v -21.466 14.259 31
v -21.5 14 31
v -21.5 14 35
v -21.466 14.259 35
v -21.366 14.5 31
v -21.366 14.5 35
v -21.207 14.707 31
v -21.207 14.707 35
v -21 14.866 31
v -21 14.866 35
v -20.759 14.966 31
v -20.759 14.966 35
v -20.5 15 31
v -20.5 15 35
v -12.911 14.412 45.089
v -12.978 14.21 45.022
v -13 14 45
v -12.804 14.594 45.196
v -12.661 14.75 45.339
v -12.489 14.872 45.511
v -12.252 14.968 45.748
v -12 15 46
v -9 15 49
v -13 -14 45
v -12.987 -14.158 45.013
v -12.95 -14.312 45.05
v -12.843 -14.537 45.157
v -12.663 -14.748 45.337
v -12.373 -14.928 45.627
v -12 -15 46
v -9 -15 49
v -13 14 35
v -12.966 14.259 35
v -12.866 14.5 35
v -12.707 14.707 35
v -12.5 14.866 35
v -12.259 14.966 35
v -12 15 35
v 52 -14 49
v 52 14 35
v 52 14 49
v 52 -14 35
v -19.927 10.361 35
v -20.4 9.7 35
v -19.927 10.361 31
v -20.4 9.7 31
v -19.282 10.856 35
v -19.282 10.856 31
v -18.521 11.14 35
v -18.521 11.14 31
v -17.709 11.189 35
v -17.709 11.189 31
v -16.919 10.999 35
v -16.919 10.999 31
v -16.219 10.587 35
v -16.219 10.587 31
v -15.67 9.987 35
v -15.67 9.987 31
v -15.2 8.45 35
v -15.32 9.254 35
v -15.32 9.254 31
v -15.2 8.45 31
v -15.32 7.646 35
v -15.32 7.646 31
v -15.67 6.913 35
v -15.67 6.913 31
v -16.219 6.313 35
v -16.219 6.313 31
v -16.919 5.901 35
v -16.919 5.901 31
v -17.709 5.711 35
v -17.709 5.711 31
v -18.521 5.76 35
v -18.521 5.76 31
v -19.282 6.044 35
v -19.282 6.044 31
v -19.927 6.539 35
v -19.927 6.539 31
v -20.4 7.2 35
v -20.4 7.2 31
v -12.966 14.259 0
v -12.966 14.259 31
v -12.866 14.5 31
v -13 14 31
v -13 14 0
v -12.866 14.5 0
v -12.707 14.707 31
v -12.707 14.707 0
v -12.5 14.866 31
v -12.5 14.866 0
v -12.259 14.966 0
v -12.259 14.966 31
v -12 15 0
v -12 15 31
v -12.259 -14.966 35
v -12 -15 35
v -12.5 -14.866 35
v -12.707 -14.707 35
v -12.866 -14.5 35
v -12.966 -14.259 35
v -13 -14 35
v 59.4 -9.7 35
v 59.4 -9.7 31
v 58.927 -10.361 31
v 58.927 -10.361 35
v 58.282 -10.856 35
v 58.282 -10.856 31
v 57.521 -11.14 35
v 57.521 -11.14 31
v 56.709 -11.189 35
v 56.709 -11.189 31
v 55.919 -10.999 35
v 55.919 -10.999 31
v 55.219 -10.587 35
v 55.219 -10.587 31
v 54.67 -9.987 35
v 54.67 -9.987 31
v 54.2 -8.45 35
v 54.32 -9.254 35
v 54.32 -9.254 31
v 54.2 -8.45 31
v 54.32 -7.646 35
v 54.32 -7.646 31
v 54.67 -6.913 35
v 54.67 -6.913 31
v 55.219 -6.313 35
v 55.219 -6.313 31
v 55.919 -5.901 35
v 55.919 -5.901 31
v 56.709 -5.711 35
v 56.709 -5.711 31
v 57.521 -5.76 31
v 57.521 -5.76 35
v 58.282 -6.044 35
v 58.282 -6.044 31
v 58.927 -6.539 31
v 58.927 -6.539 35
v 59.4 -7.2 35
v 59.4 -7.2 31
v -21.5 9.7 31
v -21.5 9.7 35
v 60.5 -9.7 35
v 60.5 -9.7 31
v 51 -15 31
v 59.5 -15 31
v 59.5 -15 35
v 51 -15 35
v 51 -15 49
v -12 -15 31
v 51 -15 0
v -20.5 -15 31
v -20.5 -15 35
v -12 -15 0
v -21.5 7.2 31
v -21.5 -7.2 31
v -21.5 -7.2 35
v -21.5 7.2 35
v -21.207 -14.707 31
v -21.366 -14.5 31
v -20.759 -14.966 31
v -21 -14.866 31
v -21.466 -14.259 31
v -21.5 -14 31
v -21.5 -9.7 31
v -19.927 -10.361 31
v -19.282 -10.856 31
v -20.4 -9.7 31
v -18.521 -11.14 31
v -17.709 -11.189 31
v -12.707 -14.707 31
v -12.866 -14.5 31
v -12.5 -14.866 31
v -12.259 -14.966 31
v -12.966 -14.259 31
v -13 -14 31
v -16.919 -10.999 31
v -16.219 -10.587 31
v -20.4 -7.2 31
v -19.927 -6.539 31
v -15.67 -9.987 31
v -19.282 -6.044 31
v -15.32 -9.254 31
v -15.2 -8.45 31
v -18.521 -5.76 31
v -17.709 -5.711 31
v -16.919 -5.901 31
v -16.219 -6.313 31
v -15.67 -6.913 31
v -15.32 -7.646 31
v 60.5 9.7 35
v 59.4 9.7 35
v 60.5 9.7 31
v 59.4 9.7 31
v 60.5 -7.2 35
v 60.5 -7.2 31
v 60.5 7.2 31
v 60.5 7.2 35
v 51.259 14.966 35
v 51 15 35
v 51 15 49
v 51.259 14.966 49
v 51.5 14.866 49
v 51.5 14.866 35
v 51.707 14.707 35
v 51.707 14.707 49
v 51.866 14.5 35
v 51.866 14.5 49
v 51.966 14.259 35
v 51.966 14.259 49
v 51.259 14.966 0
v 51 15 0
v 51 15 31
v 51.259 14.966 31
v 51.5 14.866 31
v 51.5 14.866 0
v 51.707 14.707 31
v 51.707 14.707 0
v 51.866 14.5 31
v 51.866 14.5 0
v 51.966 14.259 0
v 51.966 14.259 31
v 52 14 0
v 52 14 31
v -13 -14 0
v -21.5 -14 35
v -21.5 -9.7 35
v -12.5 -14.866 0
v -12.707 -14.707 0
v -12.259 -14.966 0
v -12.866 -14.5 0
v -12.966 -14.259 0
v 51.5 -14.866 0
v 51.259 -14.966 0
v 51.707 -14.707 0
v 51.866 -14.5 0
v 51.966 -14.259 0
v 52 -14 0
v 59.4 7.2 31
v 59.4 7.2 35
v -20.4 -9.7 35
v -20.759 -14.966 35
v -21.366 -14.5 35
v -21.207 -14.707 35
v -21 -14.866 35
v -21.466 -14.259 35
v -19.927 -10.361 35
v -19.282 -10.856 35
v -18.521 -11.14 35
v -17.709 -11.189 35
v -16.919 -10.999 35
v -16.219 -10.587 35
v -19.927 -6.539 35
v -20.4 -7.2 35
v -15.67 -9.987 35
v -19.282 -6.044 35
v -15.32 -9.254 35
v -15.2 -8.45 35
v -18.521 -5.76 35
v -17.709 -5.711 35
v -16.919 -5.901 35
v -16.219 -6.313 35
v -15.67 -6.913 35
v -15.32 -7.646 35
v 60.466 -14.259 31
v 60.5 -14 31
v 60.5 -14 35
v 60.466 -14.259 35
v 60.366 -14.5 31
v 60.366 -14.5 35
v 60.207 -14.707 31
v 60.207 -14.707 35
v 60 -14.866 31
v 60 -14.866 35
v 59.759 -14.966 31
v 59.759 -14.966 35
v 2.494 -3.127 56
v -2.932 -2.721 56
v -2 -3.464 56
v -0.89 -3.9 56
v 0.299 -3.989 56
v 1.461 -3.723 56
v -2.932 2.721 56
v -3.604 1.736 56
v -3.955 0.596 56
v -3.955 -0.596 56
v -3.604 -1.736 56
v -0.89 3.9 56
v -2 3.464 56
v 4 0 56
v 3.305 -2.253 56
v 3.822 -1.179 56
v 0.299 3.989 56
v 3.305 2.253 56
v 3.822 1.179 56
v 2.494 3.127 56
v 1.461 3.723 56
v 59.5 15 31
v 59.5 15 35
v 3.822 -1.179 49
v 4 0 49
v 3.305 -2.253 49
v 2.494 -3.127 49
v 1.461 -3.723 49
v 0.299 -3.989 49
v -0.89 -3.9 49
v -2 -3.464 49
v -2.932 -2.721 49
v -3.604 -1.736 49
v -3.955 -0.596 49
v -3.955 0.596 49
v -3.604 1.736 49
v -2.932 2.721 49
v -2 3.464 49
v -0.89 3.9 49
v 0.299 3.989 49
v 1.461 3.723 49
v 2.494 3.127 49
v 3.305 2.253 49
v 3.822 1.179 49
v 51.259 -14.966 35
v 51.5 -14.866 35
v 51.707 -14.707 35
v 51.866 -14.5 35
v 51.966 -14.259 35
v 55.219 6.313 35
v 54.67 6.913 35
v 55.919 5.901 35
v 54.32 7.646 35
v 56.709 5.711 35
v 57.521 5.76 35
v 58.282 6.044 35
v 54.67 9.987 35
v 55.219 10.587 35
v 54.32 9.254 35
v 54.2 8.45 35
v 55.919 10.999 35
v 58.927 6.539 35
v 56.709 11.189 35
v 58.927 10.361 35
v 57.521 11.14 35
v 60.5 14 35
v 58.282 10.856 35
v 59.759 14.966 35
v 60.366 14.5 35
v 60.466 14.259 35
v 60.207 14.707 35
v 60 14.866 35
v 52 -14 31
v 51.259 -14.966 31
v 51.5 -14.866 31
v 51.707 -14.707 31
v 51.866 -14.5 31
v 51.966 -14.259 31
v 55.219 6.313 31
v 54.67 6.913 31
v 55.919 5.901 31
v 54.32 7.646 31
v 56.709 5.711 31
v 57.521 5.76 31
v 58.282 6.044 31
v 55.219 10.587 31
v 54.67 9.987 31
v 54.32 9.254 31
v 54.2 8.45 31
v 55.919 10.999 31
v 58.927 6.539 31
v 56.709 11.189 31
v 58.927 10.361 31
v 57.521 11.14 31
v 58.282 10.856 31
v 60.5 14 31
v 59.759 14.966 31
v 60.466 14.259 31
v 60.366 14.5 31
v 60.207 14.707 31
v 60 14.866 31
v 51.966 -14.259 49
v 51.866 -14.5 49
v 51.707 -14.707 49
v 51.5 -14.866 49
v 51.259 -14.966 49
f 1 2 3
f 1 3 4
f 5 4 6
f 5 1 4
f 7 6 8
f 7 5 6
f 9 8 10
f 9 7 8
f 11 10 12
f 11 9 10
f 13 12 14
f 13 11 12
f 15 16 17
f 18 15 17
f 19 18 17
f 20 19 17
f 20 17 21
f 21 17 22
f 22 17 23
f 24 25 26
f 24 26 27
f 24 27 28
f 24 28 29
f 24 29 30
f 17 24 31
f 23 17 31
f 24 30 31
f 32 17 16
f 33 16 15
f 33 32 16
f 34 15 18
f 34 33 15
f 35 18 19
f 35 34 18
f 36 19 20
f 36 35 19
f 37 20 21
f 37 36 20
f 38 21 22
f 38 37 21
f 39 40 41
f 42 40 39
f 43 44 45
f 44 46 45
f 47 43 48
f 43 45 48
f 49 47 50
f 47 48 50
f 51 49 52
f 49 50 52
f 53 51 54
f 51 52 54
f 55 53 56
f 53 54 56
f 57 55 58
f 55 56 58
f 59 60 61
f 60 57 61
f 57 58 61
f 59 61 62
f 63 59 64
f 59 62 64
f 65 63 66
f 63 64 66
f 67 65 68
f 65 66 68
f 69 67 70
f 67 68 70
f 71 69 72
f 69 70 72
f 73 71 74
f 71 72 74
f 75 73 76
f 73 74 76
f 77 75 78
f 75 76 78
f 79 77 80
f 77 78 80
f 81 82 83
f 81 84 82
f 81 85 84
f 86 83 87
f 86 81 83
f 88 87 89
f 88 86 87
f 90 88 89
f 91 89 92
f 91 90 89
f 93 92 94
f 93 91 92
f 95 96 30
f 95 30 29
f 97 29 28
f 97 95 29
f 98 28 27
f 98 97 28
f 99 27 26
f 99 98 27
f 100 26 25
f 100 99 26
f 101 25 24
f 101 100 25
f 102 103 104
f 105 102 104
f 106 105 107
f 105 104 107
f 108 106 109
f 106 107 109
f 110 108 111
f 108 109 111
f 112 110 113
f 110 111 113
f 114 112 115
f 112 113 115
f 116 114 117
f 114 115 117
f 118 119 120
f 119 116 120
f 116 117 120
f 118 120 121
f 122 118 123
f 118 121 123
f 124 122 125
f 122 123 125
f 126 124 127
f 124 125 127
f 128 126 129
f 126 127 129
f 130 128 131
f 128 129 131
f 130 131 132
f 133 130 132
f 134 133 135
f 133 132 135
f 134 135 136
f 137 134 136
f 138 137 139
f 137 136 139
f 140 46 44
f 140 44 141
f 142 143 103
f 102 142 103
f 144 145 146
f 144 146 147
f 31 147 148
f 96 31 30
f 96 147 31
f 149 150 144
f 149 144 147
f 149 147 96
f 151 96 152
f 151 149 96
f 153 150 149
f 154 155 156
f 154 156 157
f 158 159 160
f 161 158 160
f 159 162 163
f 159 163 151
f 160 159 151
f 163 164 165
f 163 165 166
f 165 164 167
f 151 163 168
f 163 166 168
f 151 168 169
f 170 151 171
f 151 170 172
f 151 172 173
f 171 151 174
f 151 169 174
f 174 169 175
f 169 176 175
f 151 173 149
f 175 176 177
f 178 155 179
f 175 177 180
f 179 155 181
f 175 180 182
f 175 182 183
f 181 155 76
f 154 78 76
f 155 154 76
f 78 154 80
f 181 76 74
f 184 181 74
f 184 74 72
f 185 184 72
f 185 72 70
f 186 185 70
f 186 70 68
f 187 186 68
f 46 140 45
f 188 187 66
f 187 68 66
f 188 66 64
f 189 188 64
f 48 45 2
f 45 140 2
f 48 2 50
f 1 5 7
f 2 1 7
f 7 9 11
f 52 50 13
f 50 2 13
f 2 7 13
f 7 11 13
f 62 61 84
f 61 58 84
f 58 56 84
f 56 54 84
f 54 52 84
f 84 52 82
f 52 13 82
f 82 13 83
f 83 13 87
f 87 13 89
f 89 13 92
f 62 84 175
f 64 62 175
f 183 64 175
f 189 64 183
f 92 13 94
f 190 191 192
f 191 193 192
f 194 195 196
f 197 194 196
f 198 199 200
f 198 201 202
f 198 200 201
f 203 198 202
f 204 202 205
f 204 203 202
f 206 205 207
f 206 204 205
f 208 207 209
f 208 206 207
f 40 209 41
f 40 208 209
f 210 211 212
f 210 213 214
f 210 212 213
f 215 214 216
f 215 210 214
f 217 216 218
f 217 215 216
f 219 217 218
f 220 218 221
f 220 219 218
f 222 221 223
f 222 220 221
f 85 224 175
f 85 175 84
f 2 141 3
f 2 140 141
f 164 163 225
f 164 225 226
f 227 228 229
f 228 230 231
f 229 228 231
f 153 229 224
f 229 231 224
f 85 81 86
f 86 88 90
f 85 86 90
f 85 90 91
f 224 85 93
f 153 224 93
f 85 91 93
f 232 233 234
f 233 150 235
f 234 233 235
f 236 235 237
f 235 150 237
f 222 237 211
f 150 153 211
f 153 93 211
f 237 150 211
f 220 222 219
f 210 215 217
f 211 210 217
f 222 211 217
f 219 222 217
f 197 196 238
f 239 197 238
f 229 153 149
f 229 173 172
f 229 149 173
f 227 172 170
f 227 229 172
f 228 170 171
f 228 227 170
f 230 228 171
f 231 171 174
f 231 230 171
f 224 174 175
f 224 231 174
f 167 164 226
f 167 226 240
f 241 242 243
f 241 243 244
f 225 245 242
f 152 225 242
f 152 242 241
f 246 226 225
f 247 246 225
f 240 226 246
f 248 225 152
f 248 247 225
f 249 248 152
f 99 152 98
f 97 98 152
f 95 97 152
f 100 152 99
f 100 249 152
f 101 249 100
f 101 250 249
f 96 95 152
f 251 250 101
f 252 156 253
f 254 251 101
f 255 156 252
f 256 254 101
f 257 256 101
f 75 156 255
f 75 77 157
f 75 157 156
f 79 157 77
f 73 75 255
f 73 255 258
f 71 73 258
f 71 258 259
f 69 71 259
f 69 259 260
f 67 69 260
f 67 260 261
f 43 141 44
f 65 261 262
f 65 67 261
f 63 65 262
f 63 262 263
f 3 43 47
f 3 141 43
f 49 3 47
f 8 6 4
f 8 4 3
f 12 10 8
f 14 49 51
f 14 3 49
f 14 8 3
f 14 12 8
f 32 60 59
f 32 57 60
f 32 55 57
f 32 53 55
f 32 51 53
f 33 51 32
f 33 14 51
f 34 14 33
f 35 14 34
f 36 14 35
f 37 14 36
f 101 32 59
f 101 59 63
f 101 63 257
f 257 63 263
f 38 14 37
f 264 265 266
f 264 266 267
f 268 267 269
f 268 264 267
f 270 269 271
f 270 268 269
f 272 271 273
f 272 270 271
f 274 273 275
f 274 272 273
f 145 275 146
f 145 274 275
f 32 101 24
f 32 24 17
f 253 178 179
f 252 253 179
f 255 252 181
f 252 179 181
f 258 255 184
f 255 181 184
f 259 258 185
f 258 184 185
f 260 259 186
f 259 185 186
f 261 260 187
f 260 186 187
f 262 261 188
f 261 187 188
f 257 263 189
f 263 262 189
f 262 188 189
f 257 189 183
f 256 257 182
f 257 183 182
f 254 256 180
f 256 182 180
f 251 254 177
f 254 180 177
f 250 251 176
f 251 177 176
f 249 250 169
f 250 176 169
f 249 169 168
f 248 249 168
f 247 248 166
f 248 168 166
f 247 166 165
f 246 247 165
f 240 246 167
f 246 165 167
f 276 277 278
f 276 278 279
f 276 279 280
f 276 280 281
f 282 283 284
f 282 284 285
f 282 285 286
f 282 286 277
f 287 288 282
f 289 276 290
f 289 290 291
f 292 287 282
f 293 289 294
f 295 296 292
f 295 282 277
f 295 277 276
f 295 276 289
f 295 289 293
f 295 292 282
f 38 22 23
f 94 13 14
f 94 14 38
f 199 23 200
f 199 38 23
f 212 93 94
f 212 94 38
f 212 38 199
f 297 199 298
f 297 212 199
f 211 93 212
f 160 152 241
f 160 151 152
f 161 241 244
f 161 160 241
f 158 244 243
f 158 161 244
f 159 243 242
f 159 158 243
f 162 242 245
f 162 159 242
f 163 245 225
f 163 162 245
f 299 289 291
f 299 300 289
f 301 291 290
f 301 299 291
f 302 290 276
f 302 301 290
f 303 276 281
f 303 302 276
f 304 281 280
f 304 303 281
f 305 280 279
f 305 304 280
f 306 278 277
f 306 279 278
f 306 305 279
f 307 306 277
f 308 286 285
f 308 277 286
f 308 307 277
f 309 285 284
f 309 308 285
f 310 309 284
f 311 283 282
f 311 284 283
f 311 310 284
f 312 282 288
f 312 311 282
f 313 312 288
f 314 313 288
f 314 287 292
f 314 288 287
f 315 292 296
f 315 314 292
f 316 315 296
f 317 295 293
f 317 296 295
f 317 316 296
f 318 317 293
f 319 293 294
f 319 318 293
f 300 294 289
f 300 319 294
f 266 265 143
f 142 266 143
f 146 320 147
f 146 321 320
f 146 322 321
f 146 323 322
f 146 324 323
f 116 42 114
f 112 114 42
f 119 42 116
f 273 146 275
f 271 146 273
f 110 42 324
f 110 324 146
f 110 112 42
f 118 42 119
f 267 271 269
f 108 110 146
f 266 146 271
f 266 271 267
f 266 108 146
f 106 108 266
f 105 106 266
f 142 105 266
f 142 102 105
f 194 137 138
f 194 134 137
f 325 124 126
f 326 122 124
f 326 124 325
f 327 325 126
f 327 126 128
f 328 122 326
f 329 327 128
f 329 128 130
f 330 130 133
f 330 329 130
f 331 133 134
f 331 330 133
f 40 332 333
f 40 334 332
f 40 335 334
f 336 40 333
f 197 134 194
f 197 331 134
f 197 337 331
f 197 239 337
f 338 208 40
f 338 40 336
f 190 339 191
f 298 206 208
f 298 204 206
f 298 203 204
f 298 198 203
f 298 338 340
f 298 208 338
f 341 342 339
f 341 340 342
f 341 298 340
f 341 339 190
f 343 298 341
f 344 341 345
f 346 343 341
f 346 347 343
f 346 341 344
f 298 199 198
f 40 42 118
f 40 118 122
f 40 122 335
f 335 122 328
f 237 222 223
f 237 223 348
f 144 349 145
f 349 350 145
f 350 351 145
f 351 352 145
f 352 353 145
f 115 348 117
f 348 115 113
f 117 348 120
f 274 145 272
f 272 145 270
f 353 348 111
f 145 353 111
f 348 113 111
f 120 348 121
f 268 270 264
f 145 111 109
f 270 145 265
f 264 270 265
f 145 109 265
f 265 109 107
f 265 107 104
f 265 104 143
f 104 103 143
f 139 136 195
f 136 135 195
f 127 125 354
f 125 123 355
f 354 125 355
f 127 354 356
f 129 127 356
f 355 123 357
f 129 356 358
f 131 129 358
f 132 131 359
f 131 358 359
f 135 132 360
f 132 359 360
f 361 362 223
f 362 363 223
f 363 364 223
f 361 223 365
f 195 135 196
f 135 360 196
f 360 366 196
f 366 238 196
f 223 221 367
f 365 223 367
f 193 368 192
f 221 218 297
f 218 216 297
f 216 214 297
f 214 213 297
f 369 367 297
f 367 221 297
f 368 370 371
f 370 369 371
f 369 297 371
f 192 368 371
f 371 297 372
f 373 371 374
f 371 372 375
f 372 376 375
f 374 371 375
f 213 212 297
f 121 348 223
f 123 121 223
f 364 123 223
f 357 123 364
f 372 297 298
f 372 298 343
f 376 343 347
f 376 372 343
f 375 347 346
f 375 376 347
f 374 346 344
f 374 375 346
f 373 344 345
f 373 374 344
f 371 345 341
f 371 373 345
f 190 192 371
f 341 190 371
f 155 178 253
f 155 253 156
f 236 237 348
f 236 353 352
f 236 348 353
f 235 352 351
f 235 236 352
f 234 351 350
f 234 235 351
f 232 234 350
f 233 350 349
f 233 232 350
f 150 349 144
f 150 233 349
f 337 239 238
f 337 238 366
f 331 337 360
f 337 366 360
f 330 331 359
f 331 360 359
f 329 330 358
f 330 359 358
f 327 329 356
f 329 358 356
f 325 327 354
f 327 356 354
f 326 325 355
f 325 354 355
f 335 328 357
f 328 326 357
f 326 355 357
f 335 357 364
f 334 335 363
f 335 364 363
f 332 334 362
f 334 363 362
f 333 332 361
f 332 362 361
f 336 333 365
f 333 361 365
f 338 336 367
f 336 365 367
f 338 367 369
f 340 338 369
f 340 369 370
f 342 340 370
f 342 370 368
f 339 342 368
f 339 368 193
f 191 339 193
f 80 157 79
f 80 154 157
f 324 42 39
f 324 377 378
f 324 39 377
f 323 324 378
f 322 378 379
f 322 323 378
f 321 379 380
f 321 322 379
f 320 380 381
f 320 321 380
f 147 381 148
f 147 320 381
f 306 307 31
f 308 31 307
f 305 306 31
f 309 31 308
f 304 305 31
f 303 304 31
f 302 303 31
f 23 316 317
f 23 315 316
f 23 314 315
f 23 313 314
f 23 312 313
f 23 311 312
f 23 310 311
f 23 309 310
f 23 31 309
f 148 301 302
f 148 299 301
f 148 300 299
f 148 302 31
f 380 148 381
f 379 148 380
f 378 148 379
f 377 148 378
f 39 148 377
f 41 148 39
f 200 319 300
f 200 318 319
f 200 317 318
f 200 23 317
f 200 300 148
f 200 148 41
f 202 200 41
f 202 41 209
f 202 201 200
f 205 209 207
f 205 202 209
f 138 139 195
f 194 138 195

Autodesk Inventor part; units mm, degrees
ref_plane "YZ Plane" through (0, 0, 0) normal (1, 0, 0) x (0, 1, 0)
ref_plane "XZ Plane" through (0, 0, 0) normal (0, 1, 0) x (-1, 0, 0)
ref_plane "XY Plane" through (0, 0, 0) normal (0, 0, 1) x (1, 0, 0)
sketch "Skizze1" plane through (0, 0, 0) normal (0, 0, 1) x (1, 0, 0)
  line L0 (-12, 15) -> (51, 15)
  line L1 (52, 14) -> (52, -14)
  line L2 (51, -15) -> (-12, -15)
  line L3 (-13, -14) -> (-13, 14)
  arc A0 (-12, 15) -> (-13, 14) centre (-12, 14) ccw
  arc A1 (-13, -14) -> (-12, -15) centre (-12, -14) ccw
  arc A2 (51, -15) -> (52, -14) centre (51, -14) ccw
  arc A3 (52, 14) -> (51, 15) centre (51, 14) ccw
  point P0 (0, 0)
  point P1 (-13, 15)
  point P2 (52, 15)
  point P3 (-13, -15)
  dimension "d0" = 65
  dimension "d1" = 30
  dimension "d2" = 15
  dimension "d3" = 13
  dimension "d4" = 1
extrude "Extrusion1" add sketch "Skizze1" along normal blind 31
sketch "Skizze2" plane through (0, 0, 31) normal (0, 0, 1) x (1, 0, 0)
  line L0 (-20.5, 15) -> (59.5, 15)
  line L1 (59.5, -15) -> (-20.5, -15)
  arc A0 (-20.5, 15) -> (-21.5, 14) centre (-20.5, 14) ccw
  arc A1 (-21.5, -14) -> (-20.5, -15) centre (-20.5, -14) ccw
  arc A2 (59.5, -15) -> (60.5, -14) centre (59.5, -14) ccw
  arc A3 (60.5, 14) -> (59.5, 15) centre (59.5, 14) ccw
  arc A4 (-20.3995, 7.2) -> (-20.3995, 9.7) centre (-17.95, 8.45) ccw
  arc A5 (-20.3995, -9.7) -> (-20.3995, -7.2) centre (-17.95, -8.45) ccw
  line L2 (-20.3995, -7.2) -> (-21.5, -7.2)
  line L3 (-21.5, -9.7) -> (-20.3995, -9.7)
  line L4 (-21.5, -14) -> (-21.5, -9.7)
  line L5 (-20.3995, 9.7) -> (-21.5, 9.7)
  line L6 (-21.5, 7.2) -> (-20.3995, 7.2)
  line L7 (-21.5, -7.2) -> (-21.5, 7.2)
  line L8 (-21.5, 9.7) -> (-21.5, 14)
  line L9 (19.5, 16.9478) -> (19.5, -22.1923) construction
  arc A6 (59.3995, 9.7) -> (59.3995, 7.2) centre (56.95, 8.45) ccw
  arc A7 (59.3995, -7.2) -> (59.3995, -9.7) centre (56.95, -8.45) ccw
  line L10 (59.3995, -7.2) -> (60.5, -7.2)
  line L11 (60.5, -9.7) -> (59.3995, -9.7)
  line L12 (60.5, -14) -> (60.5, -9.7)
  line L13 (59.3995, 9.7) -> (60.5, 9.7)
  line L14 (60.5, 7.2) -> (59.3995, 7.2)
  line L15 (60.5, -7.2) -> (60.5, 7.2)
  line L16 (60.5, 9.7) -> (60.5, 14)
  point P0 (0, 0)
  point P1 (60.5, -15)
  point P2 (60.5, 15)
  dimension "d7" = 30
  dimension "d10" = 1
  dimension "d11" = 15
  dimension "d12" = 5.5
  dimension "d13" = 5.5
  dimension "d14" = 6.55
  dimension "d15" = 6.55
  dimension "d19" = 1.25
  dimension "d23" = 1.25
  dimension "d25" = 41
  dimension "d26" = 21.5
extrude "Extrusion2" add sketch "Skizze2" along normal blind 4
sketch "Skizze3" plane through (0, 0, 35) normal (0, 0, 1) x (1, 0, 0)
  line L0 (-12, 15) -> (51, 15)
  line L1 (52, 14) -> (52, -14)
  line L2 (51, -15) -> (-12, -15)
  line L3 (-13, -14) -> (-13, 14)
  arc A0 (-12, 15) -> (-13, 14) centre (-12, 14) ccw
  arc A1 (-13, -14) -> (-12, -15) centre (-12, -14) ccw
  arc A2 (51, -15) -> (52, -14) centre (51, -14) ccw
  arc A3 (52, 14) -> (51, 15) centre (51, 14) ccw
  point P0 (0, 0)
  point P1 (0, 0)
  point P2 (-13, 15)
  point P3 (52, 15)
  point P4 (-13, -15)
  dimension "d29" = 65
  dimension "d30" = 30
  dimension "d31" = 15
  dimension "d32" = 13
  dimension "d33" = 1
extrude "Extrusion3" add sketch "Skizze3" along normal blind 14
chamfer "Fase1" distance 4 angle 45 1 edges at (-13, 0, 49)
sketch "Skizze4" plane through (0, 0, 49) normal (0, 0, 1) x (1, 0, 0)
  circle A0 centre (0, 0) radius 4
  dimension "d39" = 8
extrude "Extrusion4" add sketch "Skizze4" along normal blind 7
properties part number "Servo"
